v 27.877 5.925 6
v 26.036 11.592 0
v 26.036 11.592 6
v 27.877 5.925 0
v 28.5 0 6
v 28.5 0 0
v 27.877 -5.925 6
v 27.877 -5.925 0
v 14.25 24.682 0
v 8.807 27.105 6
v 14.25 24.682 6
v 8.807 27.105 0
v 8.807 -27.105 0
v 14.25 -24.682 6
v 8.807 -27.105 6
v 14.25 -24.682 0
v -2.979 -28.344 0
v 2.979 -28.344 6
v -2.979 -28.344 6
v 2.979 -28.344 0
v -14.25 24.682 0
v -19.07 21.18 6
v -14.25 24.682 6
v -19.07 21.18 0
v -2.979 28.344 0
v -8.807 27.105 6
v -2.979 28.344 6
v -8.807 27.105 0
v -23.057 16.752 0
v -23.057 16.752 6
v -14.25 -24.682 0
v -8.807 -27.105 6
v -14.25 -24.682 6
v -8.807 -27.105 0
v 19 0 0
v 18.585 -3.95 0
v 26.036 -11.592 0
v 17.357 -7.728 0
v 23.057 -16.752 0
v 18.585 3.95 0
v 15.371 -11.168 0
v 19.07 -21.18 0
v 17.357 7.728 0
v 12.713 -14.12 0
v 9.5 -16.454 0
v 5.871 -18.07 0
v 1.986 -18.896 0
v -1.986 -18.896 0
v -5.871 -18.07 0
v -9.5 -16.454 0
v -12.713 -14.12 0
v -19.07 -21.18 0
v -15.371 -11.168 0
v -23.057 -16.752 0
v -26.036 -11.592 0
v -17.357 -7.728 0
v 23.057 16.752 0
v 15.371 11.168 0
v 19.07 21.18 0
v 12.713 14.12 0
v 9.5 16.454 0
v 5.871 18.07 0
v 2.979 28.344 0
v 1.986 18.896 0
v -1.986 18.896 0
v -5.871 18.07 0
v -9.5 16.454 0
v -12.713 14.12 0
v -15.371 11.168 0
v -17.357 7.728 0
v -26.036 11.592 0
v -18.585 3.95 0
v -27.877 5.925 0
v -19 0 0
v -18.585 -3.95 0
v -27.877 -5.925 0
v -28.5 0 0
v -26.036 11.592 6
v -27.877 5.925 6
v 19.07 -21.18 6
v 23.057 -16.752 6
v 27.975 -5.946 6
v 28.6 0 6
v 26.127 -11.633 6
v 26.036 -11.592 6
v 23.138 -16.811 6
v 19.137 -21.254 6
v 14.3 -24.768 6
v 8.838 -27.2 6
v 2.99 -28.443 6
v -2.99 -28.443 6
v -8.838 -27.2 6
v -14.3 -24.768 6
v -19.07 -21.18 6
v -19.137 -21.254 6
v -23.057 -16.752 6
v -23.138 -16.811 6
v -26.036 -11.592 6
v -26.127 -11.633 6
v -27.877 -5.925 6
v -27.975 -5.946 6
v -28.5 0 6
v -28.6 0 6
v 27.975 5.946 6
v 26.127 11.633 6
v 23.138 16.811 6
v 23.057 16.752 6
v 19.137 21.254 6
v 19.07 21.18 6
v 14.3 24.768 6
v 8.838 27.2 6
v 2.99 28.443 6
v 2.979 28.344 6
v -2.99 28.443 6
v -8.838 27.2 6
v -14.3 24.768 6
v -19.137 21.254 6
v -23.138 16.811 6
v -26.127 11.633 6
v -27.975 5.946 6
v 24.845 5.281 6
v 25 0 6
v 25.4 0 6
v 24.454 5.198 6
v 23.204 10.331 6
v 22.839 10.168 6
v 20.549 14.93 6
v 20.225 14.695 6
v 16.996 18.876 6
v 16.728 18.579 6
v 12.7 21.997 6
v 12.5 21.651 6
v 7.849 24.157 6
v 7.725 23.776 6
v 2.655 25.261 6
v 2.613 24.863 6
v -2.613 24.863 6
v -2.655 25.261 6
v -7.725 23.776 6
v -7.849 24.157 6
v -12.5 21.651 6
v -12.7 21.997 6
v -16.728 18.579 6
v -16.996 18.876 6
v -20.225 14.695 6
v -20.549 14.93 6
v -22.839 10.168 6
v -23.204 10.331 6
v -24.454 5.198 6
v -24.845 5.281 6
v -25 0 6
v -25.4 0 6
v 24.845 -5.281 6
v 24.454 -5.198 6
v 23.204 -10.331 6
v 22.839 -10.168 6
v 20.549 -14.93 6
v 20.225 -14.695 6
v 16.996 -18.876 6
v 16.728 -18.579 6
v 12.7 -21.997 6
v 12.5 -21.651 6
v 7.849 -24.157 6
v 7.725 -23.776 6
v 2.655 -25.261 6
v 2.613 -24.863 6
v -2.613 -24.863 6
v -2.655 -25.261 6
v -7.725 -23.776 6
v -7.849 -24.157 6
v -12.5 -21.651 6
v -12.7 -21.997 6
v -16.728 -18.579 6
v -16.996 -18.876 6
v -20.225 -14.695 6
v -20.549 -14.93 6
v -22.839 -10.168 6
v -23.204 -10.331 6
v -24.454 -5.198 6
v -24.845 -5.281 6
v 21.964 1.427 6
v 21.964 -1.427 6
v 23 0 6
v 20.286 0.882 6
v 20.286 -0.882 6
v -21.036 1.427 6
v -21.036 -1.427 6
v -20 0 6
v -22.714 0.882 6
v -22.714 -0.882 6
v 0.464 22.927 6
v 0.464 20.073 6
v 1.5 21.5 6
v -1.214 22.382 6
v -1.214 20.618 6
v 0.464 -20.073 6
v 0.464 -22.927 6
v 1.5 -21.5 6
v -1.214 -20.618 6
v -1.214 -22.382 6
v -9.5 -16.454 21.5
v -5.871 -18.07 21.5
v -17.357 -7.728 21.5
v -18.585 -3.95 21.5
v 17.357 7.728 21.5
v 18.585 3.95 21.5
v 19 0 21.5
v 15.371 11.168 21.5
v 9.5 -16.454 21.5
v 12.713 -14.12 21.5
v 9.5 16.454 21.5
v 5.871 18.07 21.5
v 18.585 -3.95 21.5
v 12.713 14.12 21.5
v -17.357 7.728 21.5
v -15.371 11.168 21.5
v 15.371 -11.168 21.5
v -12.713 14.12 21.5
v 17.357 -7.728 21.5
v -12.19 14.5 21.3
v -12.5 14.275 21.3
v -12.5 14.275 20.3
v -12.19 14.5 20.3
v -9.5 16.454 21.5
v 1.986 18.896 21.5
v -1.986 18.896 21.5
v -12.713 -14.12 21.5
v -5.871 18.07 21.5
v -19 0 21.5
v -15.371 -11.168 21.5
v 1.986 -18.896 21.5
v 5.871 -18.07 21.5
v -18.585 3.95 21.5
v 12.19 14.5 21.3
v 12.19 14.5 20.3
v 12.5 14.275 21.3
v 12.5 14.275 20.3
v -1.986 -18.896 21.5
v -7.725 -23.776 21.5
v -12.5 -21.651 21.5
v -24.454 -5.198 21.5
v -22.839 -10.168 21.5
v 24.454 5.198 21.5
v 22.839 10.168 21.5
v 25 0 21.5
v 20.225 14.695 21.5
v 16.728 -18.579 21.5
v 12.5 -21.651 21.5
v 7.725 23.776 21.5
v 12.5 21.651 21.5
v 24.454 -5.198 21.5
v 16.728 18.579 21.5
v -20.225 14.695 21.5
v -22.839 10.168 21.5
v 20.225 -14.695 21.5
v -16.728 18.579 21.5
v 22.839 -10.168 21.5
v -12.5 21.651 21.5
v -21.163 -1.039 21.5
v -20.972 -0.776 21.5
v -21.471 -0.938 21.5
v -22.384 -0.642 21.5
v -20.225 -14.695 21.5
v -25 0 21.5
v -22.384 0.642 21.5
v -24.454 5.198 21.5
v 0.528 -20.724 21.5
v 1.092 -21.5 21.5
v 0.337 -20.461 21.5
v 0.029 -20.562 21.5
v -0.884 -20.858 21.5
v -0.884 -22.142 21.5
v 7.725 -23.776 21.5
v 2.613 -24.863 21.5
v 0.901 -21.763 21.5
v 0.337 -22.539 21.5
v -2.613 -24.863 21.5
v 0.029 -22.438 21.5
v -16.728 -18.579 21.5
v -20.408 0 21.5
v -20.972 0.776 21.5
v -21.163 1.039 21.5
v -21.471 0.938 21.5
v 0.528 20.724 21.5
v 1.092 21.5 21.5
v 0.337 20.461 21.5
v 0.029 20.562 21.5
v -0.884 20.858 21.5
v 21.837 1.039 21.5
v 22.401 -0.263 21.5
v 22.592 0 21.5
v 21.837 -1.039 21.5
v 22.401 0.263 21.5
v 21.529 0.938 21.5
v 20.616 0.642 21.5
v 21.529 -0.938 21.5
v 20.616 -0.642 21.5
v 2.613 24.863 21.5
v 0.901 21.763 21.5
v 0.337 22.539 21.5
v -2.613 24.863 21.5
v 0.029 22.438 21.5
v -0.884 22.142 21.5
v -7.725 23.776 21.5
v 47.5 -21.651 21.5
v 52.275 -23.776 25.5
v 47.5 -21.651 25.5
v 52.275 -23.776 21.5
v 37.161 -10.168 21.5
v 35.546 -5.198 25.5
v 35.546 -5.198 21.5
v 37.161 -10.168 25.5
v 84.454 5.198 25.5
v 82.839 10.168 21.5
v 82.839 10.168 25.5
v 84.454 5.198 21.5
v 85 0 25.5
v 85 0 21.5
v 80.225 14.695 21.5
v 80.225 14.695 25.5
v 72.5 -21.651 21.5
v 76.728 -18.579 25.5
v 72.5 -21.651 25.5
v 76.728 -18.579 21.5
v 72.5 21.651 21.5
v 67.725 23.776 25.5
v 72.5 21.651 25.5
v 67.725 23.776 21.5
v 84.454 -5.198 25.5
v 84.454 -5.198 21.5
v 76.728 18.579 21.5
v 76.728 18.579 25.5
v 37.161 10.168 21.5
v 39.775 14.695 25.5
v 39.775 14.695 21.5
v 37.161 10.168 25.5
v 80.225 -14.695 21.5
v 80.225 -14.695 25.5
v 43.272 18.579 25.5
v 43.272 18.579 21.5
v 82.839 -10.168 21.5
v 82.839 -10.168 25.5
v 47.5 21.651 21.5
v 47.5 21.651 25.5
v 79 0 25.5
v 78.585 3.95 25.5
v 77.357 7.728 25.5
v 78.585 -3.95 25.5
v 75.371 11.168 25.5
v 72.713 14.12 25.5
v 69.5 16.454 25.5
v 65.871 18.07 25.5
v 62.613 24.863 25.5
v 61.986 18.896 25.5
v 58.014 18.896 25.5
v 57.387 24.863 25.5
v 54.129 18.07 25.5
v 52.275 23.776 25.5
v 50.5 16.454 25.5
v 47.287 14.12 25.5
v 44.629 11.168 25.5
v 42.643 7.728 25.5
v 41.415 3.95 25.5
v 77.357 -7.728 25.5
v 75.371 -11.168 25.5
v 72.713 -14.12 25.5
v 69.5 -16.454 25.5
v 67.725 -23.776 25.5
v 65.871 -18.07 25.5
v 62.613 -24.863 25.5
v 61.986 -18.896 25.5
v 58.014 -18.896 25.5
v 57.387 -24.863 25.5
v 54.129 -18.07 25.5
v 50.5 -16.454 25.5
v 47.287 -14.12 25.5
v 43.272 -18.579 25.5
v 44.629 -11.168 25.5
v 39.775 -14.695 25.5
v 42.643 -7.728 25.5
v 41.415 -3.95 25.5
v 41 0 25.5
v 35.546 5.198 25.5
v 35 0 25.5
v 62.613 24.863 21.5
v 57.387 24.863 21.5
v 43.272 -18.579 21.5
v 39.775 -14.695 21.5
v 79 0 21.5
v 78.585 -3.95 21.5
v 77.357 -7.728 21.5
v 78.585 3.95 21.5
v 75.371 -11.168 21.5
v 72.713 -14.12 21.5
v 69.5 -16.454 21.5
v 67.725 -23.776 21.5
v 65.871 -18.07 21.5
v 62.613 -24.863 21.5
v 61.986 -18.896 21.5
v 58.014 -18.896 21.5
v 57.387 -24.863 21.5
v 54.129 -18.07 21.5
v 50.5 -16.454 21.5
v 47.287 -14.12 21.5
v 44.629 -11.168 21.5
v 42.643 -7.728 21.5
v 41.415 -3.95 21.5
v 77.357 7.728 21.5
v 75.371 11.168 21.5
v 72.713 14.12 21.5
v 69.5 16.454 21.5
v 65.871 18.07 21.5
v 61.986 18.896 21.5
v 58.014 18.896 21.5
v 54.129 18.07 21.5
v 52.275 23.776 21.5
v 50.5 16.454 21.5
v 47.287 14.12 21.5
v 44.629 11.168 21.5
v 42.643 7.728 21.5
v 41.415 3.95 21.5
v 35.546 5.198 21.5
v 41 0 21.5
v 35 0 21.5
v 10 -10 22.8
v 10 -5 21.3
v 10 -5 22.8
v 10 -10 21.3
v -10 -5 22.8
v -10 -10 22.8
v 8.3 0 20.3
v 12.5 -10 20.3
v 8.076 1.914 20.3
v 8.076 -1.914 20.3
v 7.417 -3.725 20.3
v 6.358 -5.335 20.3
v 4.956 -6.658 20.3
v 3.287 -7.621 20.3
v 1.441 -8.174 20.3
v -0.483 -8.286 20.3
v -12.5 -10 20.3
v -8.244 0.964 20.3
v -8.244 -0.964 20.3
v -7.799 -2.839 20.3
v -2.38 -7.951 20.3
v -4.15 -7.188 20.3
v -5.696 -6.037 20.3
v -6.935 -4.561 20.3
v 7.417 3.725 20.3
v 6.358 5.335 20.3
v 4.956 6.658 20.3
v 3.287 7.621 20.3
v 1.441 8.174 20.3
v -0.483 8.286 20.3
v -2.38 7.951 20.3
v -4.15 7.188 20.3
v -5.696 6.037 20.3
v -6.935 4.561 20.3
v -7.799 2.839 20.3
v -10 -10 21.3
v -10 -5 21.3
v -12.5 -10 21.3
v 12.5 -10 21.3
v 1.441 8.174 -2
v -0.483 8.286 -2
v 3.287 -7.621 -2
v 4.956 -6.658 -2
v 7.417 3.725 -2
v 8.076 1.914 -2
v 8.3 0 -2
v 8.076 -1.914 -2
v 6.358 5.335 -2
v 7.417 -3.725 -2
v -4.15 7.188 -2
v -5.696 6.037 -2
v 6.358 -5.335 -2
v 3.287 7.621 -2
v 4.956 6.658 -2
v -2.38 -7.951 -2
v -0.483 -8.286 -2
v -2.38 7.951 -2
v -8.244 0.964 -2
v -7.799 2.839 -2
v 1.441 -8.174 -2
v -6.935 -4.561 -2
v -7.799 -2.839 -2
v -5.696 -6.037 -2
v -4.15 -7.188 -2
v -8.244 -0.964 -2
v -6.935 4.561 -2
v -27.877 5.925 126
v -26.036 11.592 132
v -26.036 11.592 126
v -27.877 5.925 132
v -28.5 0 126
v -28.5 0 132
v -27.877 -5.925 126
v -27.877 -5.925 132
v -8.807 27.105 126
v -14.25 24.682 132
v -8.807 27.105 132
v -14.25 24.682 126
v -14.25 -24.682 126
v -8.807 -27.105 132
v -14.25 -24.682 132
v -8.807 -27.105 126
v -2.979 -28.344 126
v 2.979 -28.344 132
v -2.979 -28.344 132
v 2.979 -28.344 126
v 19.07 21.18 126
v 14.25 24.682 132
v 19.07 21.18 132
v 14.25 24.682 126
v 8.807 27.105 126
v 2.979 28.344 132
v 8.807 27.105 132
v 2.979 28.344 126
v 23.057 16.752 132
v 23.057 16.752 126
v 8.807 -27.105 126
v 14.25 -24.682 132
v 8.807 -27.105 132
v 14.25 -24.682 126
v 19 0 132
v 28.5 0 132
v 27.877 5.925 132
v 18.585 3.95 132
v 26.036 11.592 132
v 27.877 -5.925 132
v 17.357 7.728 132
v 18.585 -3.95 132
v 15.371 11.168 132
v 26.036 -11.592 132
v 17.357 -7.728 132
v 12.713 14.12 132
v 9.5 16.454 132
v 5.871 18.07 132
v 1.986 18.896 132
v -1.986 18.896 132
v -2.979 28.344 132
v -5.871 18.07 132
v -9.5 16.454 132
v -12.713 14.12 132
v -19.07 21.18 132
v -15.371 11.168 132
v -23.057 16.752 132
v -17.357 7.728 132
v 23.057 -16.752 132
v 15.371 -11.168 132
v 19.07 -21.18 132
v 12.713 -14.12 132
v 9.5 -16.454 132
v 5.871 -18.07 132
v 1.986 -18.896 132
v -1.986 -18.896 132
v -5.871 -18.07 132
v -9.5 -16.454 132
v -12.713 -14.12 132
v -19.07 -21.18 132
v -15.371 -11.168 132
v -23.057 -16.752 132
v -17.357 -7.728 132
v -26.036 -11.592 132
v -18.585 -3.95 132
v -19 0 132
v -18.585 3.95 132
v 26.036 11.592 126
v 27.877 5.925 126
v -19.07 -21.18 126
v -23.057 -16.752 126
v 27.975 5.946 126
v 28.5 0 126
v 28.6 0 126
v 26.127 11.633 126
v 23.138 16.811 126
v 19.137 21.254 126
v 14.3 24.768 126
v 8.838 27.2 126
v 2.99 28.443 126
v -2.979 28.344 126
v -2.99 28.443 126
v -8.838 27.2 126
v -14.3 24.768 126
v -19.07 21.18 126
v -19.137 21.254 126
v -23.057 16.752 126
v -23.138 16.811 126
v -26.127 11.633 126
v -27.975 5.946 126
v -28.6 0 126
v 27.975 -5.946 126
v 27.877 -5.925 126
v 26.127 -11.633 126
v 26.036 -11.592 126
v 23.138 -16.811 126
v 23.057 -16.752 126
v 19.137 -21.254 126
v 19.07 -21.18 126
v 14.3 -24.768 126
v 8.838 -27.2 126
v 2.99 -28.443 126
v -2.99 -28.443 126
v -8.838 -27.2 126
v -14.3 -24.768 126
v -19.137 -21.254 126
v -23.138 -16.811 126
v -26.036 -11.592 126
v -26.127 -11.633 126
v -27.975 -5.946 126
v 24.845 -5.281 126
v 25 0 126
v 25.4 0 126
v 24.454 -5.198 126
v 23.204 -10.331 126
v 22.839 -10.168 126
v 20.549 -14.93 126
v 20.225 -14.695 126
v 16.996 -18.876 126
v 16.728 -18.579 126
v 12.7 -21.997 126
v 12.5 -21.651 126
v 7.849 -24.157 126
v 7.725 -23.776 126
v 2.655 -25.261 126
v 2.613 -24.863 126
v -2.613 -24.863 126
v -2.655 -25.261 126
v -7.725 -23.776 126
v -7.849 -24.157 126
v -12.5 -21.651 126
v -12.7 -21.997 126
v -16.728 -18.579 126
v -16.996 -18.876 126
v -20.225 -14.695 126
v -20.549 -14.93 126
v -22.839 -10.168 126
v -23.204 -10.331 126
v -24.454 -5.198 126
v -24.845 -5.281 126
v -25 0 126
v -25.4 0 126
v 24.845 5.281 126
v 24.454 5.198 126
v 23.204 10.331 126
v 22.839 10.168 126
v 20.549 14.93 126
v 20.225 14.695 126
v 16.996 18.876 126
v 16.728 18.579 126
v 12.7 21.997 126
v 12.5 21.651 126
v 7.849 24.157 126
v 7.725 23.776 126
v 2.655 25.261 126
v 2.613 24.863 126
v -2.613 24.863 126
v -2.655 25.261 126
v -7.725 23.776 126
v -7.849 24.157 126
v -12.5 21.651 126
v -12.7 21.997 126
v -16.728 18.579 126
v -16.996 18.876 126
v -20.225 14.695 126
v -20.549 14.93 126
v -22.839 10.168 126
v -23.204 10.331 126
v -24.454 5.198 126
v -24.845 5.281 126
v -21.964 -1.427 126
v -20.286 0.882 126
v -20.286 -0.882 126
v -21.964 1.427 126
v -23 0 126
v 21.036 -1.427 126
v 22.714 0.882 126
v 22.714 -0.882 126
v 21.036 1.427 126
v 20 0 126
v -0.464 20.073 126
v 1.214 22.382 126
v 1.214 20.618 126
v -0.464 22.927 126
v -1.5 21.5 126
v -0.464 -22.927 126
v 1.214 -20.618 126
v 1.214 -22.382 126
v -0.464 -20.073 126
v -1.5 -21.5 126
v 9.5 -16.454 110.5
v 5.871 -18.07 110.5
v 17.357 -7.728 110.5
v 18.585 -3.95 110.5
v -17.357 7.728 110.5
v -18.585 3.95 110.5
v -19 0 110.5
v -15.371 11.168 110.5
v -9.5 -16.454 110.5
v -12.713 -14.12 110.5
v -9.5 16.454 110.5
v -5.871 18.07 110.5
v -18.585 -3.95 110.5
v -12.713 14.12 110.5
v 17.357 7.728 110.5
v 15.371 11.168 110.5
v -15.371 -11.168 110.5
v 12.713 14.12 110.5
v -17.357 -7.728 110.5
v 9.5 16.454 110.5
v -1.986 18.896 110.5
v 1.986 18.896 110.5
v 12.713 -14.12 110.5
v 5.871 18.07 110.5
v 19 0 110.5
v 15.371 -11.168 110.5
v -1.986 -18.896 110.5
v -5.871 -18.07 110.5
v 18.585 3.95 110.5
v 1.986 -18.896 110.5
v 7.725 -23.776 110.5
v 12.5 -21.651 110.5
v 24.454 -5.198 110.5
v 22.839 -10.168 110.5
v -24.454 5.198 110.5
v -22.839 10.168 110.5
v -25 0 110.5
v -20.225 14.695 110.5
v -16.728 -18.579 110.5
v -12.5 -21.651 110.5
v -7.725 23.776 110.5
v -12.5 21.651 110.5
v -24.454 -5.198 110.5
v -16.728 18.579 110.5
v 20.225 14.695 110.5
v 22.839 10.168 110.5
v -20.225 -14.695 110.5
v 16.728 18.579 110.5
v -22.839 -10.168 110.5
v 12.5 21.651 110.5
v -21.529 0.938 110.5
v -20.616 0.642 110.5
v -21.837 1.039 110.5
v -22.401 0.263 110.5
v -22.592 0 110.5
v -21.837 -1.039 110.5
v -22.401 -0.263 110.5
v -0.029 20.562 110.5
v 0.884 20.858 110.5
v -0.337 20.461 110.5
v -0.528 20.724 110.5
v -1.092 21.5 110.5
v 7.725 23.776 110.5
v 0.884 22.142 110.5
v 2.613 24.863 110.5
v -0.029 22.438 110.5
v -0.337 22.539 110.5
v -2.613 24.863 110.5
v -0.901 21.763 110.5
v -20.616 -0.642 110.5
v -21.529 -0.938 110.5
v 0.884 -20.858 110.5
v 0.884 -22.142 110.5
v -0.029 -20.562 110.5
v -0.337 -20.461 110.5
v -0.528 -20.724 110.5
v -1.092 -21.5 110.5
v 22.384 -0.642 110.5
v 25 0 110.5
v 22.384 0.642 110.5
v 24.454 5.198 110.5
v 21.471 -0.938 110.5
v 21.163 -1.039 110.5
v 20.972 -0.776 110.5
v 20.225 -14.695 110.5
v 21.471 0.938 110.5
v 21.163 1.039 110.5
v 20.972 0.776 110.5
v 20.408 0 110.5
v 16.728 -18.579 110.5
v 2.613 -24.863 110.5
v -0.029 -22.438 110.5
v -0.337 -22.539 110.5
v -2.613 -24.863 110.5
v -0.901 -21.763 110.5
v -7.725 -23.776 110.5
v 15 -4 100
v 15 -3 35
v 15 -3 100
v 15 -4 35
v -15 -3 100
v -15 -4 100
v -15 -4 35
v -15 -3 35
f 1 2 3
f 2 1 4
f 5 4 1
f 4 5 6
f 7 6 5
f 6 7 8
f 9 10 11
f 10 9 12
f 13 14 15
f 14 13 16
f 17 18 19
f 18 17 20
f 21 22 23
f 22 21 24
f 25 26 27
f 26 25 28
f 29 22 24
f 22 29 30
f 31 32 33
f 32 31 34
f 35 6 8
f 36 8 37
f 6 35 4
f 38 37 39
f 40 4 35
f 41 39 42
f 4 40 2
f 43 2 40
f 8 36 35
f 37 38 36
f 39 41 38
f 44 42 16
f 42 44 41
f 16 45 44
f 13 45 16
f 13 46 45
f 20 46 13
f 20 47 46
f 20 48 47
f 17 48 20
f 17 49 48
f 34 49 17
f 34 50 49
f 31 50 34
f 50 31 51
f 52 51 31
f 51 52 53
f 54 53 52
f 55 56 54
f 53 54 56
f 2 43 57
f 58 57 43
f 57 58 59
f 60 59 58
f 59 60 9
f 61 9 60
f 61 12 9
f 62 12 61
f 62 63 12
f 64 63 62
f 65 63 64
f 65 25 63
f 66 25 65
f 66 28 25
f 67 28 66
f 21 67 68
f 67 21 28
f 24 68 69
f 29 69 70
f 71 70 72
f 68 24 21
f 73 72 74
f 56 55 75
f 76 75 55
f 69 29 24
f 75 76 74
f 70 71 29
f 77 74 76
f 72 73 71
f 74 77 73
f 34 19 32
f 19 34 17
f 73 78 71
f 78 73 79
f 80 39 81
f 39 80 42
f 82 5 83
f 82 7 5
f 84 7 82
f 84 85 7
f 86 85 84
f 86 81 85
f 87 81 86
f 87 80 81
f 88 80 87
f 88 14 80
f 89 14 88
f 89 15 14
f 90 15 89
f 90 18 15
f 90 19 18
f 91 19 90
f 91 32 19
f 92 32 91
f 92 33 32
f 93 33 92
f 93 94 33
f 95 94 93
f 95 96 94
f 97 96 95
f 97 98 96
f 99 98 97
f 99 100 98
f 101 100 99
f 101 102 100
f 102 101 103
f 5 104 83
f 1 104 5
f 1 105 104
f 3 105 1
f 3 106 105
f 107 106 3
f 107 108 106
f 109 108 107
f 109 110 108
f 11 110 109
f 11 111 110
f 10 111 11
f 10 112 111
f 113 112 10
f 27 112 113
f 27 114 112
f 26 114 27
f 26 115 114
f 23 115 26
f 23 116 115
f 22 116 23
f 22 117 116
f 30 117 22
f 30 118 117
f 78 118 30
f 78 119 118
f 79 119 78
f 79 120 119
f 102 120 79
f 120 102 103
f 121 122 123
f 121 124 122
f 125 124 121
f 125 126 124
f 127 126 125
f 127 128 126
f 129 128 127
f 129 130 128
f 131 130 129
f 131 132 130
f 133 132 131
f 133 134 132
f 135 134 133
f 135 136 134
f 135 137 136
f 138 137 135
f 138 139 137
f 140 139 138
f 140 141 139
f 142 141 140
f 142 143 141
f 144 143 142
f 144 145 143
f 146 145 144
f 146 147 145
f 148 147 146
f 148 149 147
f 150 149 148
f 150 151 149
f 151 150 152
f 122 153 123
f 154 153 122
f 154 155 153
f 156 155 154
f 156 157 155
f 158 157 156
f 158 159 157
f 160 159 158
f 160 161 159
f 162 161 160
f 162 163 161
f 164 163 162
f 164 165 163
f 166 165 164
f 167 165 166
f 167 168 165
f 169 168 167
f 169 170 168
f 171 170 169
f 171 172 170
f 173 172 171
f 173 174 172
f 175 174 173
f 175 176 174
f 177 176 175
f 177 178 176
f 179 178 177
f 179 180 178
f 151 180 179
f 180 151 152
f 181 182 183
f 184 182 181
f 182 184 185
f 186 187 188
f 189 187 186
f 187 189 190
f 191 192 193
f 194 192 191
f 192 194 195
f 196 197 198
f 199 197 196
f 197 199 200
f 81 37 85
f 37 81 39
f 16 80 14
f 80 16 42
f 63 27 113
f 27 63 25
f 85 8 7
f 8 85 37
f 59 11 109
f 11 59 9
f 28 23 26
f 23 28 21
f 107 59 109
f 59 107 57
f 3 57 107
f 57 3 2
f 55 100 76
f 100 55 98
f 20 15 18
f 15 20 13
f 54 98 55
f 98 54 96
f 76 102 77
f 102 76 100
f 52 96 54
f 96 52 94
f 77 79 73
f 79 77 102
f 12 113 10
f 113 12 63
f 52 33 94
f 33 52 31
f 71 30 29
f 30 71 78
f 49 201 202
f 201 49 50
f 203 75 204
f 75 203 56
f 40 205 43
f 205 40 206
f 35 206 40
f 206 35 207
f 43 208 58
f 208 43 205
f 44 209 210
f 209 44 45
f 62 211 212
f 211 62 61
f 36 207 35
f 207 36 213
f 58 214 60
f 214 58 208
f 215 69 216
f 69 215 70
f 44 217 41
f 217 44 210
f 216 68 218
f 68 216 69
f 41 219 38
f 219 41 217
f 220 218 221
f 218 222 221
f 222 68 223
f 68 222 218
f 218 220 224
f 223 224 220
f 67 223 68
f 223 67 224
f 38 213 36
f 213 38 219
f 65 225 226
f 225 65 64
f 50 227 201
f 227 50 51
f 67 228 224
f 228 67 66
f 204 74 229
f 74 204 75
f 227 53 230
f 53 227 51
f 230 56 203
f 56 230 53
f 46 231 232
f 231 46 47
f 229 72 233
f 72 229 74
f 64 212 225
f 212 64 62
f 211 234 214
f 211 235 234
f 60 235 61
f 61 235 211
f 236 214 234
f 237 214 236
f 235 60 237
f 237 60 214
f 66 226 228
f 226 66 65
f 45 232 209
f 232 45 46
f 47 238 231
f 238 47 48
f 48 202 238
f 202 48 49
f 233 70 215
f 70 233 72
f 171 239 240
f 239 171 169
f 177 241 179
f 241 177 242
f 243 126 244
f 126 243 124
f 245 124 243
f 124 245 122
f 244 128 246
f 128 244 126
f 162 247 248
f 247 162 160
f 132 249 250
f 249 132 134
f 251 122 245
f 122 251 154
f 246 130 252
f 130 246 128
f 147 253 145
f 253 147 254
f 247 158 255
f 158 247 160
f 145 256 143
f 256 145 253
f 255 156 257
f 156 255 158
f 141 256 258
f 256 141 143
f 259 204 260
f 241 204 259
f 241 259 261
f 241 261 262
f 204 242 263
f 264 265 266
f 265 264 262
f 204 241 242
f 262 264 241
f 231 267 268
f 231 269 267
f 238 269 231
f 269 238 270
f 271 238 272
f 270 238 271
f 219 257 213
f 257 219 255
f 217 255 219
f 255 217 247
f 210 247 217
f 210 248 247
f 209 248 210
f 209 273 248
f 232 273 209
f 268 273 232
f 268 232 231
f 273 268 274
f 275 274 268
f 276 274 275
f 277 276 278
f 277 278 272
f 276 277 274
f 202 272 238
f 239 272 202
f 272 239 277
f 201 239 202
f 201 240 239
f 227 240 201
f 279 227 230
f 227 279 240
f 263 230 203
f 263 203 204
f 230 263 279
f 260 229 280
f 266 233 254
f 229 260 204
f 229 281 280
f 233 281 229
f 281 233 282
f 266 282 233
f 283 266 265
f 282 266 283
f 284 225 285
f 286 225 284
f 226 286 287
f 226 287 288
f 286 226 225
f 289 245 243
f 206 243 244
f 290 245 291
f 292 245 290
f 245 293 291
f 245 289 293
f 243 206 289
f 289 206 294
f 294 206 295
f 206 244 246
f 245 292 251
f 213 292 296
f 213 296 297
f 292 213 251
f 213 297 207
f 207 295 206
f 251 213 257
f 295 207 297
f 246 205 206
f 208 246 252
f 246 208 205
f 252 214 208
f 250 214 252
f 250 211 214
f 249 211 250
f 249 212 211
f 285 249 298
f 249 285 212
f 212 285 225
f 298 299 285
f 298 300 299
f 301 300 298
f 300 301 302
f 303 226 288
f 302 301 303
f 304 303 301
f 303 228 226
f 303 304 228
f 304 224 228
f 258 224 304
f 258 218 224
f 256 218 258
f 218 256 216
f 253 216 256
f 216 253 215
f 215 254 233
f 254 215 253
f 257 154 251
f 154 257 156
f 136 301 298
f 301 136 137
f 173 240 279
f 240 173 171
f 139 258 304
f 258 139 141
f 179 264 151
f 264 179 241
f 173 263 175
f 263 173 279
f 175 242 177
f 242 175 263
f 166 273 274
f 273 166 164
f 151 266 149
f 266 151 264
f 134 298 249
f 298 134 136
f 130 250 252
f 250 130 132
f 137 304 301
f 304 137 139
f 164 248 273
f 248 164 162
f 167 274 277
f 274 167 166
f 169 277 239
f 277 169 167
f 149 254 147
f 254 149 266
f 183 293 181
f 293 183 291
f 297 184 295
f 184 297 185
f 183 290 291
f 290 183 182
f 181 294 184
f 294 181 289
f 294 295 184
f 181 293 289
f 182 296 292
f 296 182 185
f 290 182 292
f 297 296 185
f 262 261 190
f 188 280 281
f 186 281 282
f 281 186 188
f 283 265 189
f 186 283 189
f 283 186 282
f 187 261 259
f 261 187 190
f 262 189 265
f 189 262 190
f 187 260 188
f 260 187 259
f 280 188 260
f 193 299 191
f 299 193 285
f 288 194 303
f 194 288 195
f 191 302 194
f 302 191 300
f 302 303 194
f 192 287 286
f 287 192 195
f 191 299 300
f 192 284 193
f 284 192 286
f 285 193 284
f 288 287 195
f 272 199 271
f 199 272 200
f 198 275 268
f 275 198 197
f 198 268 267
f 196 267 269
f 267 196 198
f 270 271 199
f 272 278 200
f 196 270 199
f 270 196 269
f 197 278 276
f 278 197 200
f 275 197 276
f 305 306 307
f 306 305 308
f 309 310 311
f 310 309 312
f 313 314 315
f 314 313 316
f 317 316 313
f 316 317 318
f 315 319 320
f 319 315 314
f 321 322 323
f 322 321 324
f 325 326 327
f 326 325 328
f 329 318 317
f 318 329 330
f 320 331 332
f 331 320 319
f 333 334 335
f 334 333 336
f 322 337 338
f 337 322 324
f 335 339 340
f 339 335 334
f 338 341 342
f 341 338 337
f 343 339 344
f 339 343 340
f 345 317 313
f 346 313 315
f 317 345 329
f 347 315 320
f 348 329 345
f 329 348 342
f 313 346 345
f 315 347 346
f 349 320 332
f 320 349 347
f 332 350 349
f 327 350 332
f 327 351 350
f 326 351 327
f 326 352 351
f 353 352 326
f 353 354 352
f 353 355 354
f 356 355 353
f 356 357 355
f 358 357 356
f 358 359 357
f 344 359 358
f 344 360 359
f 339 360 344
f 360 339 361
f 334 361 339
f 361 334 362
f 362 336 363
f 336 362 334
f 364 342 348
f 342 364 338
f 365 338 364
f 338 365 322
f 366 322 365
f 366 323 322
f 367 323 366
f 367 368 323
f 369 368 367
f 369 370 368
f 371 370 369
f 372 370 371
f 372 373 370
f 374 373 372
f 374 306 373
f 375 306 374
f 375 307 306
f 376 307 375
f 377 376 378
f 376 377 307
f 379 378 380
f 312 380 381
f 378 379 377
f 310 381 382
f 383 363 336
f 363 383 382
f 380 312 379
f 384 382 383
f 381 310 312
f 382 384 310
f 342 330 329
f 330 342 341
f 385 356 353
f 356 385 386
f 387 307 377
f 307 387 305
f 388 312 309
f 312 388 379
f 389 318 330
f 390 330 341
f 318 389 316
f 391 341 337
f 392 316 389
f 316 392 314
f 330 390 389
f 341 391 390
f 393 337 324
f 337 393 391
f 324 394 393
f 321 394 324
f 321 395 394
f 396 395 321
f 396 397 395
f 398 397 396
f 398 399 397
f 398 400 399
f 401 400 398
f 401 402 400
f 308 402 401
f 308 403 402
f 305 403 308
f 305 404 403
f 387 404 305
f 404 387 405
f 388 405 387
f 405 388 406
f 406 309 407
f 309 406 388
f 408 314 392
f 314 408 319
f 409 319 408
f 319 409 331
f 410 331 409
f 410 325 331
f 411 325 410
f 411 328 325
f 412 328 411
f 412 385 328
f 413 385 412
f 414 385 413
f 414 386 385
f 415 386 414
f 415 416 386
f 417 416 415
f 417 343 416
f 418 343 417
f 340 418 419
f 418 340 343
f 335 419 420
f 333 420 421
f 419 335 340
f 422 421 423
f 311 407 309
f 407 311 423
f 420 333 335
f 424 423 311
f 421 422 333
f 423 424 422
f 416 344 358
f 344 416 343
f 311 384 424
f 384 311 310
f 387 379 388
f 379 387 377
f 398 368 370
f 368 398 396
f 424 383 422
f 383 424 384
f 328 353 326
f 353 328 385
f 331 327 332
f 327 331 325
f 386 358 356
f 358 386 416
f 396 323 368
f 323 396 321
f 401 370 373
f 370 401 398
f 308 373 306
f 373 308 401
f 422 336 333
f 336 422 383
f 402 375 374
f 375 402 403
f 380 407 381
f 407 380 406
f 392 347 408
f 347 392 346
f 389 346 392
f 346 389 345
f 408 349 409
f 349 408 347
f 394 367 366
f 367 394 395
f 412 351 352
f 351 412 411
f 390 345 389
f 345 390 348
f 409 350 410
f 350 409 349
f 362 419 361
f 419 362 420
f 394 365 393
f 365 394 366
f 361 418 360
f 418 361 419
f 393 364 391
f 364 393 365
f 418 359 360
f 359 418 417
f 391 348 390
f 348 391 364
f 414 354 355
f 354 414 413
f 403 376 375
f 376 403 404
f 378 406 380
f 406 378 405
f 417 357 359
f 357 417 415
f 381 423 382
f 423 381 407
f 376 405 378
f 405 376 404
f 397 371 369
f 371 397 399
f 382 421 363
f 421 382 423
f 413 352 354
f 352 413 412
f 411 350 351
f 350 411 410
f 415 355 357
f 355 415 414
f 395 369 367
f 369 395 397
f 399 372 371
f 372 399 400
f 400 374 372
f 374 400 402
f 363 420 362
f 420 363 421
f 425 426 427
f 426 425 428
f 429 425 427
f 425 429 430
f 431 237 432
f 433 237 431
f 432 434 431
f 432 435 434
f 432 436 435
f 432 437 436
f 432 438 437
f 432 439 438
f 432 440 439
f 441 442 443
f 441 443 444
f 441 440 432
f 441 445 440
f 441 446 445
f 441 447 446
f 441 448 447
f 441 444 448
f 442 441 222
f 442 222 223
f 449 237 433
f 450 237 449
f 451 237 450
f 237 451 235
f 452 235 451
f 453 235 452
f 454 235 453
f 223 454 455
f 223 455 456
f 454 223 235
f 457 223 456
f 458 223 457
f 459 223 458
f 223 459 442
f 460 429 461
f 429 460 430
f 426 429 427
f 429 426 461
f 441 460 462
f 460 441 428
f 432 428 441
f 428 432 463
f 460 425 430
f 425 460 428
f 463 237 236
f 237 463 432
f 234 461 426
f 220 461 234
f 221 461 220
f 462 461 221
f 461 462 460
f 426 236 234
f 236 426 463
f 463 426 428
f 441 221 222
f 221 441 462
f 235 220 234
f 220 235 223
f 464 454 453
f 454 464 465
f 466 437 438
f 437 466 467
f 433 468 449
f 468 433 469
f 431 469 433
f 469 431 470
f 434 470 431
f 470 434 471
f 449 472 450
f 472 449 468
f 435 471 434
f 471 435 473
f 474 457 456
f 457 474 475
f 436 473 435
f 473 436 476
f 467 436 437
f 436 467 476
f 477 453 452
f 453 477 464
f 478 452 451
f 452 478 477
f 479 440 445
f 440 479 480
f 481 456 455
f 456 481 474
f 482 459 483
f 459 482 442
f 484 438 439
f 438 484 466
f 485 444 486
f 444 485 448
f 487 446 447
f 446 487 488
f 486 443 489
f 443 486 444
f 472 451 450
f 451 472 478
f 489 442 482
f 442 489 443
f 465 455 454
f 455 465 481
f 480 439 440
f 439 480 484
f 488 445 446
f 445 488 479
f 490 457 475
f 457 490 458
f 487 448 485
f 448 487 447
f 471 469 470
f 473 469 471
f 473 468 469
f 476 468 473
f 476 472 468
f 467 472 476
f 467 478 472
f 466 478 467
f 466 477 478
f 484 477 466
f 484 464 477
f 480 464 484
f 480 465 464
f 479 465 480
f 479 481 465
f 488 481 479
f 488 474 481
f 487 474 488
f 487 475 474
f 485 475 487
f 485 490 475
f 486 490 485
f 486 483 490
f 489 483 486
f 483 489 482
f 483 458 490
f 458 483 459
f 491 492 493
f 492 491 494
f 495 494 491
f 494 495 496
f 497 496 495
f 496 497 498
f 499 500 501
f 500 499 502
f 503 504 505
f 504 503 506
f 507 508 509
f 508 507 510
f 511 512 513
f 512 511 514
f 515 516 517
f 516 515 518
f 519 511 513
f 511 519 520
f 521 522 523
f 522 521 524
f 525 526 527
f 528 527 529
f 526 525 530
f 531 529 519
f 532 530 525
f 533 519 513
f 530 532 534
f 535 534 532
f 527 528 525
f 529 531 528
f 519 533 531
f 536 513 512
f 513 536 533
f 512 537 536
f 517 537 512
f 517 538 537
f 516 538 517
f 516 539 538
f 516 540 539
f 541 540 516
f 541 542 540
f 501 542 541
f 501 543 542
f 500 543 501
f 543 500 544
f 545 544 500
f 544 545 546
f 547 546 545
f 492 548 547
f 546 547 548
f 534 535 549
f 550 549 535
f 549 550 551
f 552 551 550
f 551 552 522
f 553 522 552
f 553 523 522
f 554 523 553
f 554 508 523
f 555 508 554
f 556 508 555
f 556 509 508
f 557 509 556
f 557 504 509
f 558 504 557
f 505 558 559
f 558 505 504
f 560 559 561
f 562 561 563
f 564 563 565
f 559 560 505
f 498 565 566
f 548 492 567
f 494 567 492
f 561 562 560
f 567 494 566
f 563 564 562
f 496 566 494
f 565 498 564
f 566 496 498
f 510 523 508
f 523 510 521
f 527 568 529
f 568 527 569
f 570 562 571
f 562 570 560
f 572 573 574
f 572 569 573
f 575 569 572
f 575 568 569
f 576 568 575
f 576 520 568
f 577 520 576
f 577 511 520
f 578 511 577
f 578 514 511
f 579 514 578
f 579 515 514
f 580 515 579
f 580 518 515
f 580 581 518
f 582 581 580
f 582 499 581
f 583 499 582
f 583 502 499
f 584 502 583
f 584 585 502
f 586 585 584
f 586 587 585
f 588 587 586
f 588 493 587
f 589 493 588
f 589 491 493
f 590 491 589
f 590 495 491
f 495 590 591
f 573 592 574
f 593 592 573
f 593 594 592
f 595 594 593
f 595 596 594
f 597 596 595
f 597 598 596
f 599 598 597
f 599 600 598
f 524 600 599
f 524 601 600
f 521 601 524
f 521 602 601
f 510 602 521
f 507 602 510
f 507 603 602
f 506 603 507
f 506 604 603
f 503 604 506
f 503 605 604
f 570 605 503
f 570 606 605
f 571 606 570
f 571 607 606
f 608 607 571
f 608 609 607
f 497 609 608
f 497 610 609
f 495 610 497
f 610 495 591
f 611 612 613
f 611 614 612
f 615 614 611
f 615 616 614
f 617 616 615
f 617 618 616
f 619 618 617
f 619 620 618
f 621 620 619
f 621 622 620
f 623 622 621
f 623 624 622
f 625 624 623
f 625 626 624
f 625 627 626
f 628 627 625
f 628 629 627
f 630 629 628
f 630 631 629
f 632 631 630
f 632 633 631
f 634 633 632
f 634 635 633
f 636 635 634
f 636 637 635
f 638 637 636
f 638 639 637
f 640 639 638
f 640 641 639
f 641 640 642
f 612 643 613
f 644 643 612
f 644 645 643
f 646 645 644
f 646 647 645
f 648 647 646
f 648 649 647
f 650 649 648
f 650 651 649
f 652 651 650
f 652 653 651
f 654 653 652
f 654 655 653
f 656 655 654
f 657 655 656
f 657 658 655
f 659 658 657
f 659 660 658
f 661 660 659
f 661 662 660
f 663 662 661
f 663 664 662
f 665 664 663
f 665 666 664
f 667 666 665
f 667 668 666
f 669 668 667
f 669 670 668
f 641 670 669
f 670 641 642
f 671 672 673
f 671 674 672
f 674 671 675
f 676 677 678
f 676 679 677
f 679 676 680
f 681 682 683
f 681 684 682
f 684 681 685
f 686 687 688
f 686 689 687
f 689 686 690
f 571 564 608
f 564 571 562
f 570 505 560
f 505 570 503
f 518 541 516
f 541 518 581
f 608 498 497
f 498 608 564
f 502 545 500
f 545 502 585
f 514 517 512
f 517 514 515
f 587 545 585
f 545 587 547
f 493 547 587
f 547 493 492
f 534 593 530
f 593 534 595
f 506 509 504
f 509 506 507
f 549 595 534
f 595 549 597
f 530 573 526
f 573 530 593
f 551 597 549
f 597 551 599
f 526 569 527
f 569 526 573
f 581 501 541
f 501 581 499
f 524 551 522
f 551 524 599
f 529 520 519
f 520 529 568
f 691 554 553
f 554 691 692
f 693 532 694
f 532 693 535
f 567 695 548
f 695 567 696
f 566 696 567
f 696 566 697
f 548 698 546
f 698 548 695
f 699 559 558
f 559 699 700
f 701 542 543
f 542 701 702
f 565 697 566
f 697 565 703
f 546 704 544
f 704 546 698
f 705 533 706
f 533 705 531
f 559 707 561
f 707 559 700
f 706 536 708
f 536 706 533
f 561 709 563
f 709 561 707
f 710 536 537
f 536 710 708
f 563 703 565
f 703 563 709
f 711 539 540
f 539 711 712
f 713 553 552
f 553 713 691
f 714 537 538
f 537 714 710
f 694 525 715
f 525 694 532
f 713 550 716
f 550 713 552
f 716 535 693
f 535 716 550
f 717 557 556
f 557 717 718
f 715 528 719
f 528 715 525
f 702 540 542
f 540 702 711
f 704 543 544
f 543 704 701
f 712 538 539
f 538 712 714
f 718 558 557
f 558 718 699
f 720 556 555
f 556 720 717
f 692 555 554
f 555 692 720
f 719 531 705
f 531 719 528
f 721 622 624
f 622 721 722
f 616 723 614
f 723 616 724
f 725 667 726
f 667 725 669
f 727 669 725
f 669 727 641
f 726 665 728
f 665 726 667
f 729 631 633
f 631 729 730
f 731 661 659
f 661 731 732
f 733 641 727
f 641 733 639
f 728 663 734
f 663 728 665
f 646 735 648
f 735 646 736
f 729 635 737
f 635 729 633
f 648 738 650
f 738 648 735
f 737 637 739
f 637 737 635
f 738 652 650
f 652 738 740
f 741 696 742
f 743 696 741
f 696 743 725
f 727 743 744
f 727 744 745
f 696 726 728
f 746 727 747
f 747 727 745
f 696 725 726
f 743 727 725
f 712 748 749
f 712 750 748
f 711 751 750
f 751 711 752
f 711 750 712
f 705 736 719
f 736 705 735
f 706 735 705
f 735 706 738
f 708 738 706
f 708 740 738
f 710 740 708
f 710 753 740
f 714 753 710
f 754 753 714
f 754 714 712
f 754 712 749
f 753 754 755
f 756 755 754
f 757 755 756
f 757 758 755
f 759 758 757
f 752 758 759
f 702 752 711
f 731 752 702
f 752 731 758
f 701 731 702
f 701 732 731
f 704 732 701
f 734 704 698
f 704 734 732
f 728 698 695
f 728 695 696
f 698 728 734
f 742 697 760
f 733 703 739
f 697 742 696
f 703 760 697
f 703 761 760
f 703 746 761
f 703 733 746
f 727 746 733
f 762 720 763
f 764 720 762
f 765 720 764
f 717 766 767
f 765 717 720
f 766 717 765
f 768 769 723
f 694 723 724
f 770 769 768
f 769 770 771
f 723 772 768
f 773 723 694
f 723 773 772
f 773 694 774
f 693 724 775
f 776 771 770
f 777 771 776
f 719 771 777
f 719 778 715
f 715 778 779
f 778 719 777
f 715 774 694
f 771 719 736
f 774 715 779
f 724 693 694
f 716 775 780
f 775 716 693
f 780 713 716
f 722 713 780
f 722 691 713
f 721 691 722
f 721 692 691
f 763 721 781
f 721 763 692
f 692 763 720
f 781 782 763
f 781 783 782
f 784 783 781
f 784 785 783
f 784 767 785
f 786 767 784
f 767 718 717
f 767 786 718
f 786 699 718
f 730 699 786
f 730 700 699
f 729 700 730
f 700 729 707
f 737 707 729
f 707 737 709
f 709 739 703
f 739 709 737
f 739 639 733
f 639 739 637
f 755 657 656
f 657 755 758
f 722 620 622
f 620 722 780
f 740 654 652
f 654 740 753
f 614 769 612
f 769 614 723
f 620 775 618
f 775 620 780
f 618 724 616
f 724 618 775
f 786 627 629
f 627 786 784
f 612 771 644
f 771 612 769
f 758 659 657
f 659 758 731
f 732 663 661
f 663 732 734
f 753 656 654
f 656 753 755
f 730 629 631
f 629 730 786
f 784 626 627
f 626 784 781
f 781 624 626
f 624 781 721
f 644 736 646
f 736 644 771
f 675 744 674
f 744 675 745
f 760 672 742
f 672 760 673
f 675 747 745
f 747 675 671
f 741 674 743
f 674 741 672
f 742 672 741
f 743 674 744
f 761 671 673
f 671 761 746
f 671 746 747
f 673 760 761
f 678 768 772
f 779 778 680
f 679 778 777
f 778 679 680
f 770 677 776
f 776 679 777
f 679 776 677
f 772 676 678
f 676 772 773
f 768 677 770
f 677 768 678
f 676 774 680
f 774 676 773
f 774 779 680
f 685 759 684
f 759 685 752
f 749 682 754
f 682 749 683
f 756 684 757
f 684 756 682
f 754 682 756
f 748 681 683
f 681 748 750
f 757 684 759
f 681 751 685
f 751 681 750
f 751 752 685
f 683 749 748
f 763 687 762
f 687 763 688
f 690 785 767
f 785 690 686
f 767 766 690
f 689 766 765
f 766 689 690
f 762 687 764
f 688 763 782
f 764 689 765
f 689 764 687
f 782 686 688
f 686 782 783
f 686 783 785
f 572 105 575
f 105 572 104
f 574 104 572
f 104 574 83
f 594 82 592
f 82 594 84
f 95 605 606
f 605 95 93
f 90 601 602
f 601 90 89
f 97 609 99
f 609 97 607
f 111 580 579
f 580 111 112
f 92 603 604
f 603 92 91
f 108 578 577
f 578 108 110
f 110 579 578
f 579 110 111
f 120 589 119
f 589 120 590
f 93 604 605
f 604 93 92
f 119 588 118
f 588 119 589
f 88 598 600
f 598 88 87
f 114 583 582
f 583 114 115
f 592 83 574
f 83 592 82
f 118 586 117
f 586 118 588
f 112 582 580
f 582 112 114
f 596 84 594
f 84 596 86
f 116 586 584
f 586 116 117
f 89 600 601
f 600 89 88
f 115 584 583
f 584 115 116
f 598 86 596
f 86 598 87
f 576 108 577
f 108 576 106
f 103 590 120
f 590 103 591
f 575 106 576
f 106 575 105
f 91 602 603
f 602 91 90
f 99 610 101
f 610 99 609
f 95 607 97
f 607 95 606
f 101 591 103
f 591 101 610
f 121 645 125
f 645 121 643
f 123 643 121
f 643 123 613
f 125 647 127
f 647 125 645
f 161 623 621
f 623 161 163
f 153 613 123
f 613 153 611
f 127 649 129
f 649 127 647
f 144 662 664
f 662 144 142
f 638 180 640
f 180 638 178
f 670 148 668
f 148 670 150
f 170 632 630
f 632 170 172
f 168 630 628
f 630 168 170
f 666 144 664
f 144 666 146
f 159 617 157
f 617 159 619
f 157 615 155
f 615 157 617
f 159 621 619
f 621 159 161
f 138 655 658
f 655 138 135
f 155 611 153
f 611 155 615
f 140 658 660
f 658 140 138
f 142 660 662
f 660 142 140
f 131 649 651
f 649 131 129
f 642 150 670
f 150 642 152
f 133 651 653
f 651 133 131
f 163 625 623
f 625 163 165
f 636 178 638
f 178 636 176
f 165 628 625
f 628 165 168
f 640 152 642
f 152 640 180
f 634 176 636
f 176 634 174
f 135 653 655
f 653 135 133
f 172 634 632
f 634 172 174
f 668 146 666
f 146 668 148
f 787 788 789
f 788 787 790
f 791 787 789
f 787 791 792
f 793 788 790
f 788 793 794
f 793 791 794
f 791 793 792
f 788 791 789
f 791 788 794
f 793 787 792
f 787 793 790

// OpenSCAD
// in mm

// TODO get some constants to keep sane

// Tube module -- radius is outer radius
module tube(height, radius, wall) {
  difference() {
    cylinder(h=height, r=radius);
    translate([0, 0, -1]) cylinder(h=height+2, r=radius-wall);
  }
}

// Flange module
module flange() {
  color("gray") tube(6, 57/2, 7/2+12/2);
  translate([0, 0, 6]) color("gray") difference() {
    tube(21.5-6, 50/2, 12/2);
    translate([21.5, 0, 0]) cylinder(19, 1.5); // TODO wrong depth
    translate([-21.5, 0, 0]) cylinder(19, 1.5);
    translate([0, 21.5, 0]) cylinder(19, 1.5);
    translate([0, -21.5, 0]) cylinder(19, 1.5);
  }
}

// --- main unit --

// Top flange
flange();

// Flange connector
translate([60, 0, 31/2+6]) color("blue") tube(4, 50/2, 12/2);
// TODO add screw holes

// Camera
translate([0, 0, -2]) union() {
  translate([-25/2+2.5, -10, 22.3]) cube([20, 5, 2.5]);
  translate([-25/2, -10, 22.3]) cube([25, 24.5, 1]);
  cylinder(h=22.3, r=8.3);
}

// Camera sled
//translate([2.5, 0, 59-19]) cube([25, 24.5, 2]);

// Electronics sled
//translate([2.5, 0, 59-19]) cube([15, 11, 19]);

// Pi Zero
translate([-15, -4, 35]) cube([30, 1, 65]);

// -- tube and bottom flange, attached later --

// Bottom flange
translate([0, 0, 132]) rotate([0, 180, 0]) flange();

// Tube
color("white", 0.1) translate([0, 0, 6]) tube(120, 57.2/2, 3.2);
